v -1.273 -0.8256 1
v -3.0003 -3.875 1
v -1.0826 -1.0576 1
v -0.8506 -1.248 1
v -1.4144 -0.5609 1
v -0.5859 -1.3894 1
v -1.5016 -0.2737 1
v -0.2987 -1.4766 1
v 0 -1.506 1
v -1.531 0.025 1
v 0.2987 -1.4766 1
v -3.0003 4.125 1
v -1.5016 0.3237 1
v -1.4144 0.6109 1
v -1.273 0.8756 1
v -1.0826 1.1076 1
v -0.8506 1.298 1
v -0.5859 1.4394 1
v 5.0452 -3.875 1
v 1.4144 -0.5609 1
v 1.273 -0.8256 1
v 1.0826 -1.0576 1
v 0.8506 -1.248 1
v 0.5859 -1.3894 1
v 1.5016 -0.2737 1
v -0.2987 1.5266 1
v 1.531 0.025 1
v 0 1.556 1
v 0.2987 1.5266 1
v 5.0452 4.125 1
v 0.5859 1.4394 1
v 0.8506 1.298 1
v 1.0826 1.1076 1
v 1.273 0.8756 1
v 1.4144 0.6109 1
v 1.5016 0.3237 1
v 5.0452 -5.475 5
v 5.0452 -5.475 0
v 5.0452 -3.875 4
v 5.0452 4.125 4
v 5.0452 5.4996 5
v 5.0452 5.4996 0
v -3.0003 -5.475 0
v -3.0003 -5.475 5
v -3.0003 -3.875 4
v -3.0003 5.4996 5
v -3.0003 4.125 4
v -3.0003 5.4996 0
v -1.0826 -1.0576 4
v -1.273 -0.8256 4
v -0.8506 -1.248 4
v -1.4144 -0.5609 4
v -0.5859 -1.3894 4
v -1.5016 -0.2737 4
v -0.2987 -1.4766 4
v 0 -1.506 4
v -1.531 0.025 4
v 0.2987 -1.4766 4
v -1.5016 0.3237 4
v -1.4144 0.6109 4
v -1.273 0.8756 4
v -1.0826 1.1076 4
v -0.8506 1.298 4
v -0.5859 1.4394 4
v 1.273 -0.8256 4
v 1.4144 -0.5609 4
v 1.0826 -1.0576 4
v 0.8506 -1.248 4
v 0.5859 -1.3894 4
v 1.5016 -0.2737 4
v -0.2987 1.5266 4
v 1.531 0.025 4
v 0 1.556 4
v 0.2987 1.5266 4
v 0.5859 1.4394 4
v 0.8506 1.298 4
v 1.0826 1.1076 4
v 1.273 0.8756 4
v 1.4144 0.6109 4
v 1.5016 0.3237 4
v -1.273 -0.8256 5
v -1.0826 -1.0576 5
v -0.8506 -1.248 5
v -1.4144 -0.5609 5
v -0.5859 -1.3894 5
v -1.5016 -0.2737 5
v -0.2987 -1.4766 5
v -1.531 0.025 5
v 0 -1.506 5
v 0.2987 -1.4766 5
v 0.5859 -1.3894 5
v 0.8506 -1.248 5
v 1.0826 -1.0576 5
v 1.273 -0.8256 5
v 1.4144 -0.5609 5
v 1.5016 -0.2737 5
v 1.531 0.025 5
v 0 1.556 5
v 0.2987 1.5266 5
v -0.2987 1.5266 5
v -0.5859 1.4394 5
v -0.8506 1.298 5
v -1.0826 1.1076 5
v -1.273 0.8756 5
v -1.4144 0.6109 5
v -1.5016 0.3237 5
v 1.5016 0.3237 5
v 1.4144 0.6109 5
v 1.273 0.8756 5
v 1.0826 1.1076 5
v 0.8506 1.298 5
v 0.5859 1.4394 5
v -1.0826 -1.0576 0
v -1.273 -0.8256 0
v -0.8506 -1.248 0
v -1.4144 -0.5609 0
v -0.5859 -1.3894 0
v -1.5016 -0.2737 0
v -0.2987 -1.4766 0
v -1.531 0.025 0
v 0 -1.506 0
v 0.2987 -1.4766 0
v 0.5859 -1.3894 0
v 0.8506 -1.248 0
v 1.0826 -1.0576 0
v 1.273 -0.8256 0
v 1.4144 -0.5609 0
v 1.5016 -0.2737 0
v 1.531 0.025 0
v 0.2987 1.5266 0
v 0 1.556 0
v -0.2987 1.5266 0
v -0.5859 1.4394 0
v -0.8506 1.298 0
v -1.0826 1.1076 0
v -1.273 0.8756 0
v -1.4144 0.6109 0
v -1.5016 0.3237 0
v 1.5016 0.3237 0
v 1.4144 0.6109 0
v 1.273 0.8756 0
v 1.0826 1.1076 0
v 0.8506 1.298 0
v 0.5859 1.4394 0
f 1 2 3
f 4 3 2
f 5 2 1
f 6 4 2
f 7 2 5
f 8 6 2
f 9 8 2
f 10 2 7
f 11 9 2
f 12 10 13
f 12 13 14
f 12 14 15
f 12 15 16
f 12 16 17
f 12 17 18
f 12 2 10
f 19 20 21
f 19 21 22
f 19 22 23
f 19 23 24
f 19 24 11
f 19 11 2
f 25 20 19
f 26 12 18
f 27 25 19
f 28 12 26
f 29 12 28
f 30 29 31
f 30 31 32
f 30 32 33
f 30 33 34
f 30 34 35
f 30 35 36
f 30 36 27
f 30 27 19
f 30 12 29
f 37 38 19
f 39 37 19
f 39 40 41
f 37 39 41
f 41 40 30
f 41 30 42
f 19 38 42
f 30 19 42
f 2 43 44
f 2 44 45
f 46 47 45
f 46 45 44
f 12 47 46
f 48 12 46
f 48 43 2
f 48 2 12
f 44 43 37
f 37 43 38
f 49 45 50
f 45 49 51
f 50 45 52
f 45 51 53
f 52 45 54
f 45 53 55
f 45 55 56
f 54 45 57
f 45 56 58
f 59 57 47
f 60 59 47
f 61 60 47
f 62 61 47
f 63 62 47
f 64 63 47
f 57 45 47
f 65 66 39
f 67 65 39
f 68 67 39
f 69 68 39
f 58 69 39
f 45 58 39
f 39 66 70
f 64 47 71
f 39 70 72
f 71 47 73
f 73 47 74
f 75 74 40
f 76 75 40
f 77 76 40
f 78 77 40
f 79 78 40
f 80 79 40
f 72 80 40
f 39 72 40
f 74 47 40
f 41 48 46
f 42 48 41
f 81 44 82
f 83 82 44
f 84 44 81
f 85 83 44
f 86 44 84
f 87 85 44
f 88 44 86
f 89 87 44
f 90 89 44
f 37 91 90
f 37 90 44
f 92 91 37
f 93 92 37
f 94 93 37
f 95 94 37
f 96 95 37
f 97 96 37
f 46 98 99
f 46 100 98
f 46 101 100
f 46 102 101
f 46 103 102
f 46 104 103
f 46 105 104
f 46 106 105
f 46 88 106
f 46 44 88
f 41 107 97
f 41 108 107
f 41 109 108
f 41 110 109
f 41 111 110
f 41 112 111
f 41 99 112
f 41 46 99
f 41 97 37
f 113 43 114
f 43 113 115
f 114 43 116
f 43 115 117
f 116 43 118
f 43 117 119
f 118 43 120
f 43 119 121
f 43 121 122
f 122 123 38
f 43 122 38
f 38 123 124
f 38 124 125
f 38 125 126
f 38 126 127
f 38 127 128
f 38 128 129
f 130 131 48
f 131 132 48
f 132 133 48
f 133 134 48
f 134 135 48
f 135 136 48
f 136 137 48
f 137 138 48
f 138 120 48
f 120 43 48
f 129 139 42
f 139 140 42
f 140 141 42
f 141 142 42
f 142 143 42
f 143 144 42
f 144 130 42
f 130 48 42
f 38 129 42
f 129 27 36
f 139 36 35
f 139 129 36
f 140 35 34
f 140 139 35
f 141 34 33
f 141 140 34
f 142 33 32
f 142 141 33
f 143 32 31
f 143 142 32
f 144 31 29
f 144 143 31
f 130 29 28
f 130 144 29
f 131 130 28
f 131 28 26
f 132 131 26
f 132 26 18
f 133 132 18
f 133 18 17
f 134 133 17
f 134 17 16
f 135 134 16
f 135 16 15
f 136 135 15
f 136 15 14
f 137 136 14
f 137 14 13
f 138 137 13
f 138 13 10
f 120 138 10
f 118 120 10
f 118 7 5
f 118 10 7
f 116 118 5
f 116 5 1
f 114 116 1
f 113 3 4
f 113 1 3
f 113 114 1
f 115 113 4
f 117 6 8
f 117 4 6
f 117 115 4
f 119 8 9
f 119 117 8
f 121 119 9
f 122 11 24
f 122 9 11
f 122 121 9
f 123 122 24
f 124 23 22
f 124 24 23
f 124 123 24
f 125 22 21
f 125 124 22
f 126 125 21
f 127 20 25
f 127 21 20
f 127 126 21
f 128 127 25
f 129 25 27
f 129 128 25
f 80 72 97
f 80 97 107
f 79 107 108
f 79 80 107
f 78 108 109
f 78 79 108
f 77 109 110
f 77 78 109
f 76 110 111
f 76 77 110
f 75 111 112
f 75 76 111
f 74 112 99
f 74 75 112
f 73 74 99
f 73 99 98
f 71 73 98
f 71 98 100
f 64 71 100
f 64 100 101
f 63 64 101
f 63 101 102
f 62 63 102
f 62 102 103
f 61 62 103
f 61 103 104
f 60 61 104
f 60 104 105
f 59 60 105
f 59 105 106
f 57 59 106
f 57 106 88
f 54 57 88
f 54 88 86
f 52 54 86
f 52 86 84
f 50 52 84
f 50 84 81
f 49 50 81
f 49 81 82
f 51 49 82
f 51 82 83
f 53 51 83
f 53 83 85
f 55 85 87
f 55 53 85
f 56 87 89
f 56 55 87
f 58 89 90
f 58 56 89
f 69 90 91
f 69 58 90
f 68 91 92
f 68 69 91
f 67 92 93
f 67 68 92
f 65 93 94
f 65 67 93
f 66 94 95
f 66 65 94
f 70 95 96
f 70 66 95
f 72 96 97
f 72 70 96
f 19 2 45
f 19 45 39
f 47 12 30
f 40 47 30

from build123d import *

# Parameters (mm, degrees)
BOX002_W     = 9.5
BOX002_H     = 8
BOX002_DEPTH = 3
SKETCH008_W  = 8.045495
SKETCH008_H  = 10.974572
SKETCH008_R  = 1.530969
PAD008_DEPTH = 5


with BuildPart() as body046:
    # Box002 → Box002 (new body)
    with BuildSketch(Plane.XY):
        with Locations((4.75, 4)):
            Rectangle(BOX002_W, BOX002_H)
    extrude(amount=BOX002_DEPTH)


with BuildPart() as body046_1:
    # Body046 placement: moved
    add(body046.part.moved(Location((-4, -3.9, 1))))


with BuildPart() as cut006:
    # Sketch008 → Pad008 (new body)
    with BuildSketch(Plane.XY):
        with Locations((1.022447, -0.012719)):
            Rectangle(SKETCH008_W, SKETCH008_H)
        Circle(SKETCH008_R, mode=Mode.SUBTRACT)
    extrude(amount=PAD008_DEPTH)

    # Cut006: cut Body046
    add(body046_1.part, mode=Mode.SUBTRACT)


with BuildPart() as cut006_1:
    # Cut006 placement: moved
    add(cut006.part.moved(Location((0, 0.025, 0))))


solid = cut006_1.part
